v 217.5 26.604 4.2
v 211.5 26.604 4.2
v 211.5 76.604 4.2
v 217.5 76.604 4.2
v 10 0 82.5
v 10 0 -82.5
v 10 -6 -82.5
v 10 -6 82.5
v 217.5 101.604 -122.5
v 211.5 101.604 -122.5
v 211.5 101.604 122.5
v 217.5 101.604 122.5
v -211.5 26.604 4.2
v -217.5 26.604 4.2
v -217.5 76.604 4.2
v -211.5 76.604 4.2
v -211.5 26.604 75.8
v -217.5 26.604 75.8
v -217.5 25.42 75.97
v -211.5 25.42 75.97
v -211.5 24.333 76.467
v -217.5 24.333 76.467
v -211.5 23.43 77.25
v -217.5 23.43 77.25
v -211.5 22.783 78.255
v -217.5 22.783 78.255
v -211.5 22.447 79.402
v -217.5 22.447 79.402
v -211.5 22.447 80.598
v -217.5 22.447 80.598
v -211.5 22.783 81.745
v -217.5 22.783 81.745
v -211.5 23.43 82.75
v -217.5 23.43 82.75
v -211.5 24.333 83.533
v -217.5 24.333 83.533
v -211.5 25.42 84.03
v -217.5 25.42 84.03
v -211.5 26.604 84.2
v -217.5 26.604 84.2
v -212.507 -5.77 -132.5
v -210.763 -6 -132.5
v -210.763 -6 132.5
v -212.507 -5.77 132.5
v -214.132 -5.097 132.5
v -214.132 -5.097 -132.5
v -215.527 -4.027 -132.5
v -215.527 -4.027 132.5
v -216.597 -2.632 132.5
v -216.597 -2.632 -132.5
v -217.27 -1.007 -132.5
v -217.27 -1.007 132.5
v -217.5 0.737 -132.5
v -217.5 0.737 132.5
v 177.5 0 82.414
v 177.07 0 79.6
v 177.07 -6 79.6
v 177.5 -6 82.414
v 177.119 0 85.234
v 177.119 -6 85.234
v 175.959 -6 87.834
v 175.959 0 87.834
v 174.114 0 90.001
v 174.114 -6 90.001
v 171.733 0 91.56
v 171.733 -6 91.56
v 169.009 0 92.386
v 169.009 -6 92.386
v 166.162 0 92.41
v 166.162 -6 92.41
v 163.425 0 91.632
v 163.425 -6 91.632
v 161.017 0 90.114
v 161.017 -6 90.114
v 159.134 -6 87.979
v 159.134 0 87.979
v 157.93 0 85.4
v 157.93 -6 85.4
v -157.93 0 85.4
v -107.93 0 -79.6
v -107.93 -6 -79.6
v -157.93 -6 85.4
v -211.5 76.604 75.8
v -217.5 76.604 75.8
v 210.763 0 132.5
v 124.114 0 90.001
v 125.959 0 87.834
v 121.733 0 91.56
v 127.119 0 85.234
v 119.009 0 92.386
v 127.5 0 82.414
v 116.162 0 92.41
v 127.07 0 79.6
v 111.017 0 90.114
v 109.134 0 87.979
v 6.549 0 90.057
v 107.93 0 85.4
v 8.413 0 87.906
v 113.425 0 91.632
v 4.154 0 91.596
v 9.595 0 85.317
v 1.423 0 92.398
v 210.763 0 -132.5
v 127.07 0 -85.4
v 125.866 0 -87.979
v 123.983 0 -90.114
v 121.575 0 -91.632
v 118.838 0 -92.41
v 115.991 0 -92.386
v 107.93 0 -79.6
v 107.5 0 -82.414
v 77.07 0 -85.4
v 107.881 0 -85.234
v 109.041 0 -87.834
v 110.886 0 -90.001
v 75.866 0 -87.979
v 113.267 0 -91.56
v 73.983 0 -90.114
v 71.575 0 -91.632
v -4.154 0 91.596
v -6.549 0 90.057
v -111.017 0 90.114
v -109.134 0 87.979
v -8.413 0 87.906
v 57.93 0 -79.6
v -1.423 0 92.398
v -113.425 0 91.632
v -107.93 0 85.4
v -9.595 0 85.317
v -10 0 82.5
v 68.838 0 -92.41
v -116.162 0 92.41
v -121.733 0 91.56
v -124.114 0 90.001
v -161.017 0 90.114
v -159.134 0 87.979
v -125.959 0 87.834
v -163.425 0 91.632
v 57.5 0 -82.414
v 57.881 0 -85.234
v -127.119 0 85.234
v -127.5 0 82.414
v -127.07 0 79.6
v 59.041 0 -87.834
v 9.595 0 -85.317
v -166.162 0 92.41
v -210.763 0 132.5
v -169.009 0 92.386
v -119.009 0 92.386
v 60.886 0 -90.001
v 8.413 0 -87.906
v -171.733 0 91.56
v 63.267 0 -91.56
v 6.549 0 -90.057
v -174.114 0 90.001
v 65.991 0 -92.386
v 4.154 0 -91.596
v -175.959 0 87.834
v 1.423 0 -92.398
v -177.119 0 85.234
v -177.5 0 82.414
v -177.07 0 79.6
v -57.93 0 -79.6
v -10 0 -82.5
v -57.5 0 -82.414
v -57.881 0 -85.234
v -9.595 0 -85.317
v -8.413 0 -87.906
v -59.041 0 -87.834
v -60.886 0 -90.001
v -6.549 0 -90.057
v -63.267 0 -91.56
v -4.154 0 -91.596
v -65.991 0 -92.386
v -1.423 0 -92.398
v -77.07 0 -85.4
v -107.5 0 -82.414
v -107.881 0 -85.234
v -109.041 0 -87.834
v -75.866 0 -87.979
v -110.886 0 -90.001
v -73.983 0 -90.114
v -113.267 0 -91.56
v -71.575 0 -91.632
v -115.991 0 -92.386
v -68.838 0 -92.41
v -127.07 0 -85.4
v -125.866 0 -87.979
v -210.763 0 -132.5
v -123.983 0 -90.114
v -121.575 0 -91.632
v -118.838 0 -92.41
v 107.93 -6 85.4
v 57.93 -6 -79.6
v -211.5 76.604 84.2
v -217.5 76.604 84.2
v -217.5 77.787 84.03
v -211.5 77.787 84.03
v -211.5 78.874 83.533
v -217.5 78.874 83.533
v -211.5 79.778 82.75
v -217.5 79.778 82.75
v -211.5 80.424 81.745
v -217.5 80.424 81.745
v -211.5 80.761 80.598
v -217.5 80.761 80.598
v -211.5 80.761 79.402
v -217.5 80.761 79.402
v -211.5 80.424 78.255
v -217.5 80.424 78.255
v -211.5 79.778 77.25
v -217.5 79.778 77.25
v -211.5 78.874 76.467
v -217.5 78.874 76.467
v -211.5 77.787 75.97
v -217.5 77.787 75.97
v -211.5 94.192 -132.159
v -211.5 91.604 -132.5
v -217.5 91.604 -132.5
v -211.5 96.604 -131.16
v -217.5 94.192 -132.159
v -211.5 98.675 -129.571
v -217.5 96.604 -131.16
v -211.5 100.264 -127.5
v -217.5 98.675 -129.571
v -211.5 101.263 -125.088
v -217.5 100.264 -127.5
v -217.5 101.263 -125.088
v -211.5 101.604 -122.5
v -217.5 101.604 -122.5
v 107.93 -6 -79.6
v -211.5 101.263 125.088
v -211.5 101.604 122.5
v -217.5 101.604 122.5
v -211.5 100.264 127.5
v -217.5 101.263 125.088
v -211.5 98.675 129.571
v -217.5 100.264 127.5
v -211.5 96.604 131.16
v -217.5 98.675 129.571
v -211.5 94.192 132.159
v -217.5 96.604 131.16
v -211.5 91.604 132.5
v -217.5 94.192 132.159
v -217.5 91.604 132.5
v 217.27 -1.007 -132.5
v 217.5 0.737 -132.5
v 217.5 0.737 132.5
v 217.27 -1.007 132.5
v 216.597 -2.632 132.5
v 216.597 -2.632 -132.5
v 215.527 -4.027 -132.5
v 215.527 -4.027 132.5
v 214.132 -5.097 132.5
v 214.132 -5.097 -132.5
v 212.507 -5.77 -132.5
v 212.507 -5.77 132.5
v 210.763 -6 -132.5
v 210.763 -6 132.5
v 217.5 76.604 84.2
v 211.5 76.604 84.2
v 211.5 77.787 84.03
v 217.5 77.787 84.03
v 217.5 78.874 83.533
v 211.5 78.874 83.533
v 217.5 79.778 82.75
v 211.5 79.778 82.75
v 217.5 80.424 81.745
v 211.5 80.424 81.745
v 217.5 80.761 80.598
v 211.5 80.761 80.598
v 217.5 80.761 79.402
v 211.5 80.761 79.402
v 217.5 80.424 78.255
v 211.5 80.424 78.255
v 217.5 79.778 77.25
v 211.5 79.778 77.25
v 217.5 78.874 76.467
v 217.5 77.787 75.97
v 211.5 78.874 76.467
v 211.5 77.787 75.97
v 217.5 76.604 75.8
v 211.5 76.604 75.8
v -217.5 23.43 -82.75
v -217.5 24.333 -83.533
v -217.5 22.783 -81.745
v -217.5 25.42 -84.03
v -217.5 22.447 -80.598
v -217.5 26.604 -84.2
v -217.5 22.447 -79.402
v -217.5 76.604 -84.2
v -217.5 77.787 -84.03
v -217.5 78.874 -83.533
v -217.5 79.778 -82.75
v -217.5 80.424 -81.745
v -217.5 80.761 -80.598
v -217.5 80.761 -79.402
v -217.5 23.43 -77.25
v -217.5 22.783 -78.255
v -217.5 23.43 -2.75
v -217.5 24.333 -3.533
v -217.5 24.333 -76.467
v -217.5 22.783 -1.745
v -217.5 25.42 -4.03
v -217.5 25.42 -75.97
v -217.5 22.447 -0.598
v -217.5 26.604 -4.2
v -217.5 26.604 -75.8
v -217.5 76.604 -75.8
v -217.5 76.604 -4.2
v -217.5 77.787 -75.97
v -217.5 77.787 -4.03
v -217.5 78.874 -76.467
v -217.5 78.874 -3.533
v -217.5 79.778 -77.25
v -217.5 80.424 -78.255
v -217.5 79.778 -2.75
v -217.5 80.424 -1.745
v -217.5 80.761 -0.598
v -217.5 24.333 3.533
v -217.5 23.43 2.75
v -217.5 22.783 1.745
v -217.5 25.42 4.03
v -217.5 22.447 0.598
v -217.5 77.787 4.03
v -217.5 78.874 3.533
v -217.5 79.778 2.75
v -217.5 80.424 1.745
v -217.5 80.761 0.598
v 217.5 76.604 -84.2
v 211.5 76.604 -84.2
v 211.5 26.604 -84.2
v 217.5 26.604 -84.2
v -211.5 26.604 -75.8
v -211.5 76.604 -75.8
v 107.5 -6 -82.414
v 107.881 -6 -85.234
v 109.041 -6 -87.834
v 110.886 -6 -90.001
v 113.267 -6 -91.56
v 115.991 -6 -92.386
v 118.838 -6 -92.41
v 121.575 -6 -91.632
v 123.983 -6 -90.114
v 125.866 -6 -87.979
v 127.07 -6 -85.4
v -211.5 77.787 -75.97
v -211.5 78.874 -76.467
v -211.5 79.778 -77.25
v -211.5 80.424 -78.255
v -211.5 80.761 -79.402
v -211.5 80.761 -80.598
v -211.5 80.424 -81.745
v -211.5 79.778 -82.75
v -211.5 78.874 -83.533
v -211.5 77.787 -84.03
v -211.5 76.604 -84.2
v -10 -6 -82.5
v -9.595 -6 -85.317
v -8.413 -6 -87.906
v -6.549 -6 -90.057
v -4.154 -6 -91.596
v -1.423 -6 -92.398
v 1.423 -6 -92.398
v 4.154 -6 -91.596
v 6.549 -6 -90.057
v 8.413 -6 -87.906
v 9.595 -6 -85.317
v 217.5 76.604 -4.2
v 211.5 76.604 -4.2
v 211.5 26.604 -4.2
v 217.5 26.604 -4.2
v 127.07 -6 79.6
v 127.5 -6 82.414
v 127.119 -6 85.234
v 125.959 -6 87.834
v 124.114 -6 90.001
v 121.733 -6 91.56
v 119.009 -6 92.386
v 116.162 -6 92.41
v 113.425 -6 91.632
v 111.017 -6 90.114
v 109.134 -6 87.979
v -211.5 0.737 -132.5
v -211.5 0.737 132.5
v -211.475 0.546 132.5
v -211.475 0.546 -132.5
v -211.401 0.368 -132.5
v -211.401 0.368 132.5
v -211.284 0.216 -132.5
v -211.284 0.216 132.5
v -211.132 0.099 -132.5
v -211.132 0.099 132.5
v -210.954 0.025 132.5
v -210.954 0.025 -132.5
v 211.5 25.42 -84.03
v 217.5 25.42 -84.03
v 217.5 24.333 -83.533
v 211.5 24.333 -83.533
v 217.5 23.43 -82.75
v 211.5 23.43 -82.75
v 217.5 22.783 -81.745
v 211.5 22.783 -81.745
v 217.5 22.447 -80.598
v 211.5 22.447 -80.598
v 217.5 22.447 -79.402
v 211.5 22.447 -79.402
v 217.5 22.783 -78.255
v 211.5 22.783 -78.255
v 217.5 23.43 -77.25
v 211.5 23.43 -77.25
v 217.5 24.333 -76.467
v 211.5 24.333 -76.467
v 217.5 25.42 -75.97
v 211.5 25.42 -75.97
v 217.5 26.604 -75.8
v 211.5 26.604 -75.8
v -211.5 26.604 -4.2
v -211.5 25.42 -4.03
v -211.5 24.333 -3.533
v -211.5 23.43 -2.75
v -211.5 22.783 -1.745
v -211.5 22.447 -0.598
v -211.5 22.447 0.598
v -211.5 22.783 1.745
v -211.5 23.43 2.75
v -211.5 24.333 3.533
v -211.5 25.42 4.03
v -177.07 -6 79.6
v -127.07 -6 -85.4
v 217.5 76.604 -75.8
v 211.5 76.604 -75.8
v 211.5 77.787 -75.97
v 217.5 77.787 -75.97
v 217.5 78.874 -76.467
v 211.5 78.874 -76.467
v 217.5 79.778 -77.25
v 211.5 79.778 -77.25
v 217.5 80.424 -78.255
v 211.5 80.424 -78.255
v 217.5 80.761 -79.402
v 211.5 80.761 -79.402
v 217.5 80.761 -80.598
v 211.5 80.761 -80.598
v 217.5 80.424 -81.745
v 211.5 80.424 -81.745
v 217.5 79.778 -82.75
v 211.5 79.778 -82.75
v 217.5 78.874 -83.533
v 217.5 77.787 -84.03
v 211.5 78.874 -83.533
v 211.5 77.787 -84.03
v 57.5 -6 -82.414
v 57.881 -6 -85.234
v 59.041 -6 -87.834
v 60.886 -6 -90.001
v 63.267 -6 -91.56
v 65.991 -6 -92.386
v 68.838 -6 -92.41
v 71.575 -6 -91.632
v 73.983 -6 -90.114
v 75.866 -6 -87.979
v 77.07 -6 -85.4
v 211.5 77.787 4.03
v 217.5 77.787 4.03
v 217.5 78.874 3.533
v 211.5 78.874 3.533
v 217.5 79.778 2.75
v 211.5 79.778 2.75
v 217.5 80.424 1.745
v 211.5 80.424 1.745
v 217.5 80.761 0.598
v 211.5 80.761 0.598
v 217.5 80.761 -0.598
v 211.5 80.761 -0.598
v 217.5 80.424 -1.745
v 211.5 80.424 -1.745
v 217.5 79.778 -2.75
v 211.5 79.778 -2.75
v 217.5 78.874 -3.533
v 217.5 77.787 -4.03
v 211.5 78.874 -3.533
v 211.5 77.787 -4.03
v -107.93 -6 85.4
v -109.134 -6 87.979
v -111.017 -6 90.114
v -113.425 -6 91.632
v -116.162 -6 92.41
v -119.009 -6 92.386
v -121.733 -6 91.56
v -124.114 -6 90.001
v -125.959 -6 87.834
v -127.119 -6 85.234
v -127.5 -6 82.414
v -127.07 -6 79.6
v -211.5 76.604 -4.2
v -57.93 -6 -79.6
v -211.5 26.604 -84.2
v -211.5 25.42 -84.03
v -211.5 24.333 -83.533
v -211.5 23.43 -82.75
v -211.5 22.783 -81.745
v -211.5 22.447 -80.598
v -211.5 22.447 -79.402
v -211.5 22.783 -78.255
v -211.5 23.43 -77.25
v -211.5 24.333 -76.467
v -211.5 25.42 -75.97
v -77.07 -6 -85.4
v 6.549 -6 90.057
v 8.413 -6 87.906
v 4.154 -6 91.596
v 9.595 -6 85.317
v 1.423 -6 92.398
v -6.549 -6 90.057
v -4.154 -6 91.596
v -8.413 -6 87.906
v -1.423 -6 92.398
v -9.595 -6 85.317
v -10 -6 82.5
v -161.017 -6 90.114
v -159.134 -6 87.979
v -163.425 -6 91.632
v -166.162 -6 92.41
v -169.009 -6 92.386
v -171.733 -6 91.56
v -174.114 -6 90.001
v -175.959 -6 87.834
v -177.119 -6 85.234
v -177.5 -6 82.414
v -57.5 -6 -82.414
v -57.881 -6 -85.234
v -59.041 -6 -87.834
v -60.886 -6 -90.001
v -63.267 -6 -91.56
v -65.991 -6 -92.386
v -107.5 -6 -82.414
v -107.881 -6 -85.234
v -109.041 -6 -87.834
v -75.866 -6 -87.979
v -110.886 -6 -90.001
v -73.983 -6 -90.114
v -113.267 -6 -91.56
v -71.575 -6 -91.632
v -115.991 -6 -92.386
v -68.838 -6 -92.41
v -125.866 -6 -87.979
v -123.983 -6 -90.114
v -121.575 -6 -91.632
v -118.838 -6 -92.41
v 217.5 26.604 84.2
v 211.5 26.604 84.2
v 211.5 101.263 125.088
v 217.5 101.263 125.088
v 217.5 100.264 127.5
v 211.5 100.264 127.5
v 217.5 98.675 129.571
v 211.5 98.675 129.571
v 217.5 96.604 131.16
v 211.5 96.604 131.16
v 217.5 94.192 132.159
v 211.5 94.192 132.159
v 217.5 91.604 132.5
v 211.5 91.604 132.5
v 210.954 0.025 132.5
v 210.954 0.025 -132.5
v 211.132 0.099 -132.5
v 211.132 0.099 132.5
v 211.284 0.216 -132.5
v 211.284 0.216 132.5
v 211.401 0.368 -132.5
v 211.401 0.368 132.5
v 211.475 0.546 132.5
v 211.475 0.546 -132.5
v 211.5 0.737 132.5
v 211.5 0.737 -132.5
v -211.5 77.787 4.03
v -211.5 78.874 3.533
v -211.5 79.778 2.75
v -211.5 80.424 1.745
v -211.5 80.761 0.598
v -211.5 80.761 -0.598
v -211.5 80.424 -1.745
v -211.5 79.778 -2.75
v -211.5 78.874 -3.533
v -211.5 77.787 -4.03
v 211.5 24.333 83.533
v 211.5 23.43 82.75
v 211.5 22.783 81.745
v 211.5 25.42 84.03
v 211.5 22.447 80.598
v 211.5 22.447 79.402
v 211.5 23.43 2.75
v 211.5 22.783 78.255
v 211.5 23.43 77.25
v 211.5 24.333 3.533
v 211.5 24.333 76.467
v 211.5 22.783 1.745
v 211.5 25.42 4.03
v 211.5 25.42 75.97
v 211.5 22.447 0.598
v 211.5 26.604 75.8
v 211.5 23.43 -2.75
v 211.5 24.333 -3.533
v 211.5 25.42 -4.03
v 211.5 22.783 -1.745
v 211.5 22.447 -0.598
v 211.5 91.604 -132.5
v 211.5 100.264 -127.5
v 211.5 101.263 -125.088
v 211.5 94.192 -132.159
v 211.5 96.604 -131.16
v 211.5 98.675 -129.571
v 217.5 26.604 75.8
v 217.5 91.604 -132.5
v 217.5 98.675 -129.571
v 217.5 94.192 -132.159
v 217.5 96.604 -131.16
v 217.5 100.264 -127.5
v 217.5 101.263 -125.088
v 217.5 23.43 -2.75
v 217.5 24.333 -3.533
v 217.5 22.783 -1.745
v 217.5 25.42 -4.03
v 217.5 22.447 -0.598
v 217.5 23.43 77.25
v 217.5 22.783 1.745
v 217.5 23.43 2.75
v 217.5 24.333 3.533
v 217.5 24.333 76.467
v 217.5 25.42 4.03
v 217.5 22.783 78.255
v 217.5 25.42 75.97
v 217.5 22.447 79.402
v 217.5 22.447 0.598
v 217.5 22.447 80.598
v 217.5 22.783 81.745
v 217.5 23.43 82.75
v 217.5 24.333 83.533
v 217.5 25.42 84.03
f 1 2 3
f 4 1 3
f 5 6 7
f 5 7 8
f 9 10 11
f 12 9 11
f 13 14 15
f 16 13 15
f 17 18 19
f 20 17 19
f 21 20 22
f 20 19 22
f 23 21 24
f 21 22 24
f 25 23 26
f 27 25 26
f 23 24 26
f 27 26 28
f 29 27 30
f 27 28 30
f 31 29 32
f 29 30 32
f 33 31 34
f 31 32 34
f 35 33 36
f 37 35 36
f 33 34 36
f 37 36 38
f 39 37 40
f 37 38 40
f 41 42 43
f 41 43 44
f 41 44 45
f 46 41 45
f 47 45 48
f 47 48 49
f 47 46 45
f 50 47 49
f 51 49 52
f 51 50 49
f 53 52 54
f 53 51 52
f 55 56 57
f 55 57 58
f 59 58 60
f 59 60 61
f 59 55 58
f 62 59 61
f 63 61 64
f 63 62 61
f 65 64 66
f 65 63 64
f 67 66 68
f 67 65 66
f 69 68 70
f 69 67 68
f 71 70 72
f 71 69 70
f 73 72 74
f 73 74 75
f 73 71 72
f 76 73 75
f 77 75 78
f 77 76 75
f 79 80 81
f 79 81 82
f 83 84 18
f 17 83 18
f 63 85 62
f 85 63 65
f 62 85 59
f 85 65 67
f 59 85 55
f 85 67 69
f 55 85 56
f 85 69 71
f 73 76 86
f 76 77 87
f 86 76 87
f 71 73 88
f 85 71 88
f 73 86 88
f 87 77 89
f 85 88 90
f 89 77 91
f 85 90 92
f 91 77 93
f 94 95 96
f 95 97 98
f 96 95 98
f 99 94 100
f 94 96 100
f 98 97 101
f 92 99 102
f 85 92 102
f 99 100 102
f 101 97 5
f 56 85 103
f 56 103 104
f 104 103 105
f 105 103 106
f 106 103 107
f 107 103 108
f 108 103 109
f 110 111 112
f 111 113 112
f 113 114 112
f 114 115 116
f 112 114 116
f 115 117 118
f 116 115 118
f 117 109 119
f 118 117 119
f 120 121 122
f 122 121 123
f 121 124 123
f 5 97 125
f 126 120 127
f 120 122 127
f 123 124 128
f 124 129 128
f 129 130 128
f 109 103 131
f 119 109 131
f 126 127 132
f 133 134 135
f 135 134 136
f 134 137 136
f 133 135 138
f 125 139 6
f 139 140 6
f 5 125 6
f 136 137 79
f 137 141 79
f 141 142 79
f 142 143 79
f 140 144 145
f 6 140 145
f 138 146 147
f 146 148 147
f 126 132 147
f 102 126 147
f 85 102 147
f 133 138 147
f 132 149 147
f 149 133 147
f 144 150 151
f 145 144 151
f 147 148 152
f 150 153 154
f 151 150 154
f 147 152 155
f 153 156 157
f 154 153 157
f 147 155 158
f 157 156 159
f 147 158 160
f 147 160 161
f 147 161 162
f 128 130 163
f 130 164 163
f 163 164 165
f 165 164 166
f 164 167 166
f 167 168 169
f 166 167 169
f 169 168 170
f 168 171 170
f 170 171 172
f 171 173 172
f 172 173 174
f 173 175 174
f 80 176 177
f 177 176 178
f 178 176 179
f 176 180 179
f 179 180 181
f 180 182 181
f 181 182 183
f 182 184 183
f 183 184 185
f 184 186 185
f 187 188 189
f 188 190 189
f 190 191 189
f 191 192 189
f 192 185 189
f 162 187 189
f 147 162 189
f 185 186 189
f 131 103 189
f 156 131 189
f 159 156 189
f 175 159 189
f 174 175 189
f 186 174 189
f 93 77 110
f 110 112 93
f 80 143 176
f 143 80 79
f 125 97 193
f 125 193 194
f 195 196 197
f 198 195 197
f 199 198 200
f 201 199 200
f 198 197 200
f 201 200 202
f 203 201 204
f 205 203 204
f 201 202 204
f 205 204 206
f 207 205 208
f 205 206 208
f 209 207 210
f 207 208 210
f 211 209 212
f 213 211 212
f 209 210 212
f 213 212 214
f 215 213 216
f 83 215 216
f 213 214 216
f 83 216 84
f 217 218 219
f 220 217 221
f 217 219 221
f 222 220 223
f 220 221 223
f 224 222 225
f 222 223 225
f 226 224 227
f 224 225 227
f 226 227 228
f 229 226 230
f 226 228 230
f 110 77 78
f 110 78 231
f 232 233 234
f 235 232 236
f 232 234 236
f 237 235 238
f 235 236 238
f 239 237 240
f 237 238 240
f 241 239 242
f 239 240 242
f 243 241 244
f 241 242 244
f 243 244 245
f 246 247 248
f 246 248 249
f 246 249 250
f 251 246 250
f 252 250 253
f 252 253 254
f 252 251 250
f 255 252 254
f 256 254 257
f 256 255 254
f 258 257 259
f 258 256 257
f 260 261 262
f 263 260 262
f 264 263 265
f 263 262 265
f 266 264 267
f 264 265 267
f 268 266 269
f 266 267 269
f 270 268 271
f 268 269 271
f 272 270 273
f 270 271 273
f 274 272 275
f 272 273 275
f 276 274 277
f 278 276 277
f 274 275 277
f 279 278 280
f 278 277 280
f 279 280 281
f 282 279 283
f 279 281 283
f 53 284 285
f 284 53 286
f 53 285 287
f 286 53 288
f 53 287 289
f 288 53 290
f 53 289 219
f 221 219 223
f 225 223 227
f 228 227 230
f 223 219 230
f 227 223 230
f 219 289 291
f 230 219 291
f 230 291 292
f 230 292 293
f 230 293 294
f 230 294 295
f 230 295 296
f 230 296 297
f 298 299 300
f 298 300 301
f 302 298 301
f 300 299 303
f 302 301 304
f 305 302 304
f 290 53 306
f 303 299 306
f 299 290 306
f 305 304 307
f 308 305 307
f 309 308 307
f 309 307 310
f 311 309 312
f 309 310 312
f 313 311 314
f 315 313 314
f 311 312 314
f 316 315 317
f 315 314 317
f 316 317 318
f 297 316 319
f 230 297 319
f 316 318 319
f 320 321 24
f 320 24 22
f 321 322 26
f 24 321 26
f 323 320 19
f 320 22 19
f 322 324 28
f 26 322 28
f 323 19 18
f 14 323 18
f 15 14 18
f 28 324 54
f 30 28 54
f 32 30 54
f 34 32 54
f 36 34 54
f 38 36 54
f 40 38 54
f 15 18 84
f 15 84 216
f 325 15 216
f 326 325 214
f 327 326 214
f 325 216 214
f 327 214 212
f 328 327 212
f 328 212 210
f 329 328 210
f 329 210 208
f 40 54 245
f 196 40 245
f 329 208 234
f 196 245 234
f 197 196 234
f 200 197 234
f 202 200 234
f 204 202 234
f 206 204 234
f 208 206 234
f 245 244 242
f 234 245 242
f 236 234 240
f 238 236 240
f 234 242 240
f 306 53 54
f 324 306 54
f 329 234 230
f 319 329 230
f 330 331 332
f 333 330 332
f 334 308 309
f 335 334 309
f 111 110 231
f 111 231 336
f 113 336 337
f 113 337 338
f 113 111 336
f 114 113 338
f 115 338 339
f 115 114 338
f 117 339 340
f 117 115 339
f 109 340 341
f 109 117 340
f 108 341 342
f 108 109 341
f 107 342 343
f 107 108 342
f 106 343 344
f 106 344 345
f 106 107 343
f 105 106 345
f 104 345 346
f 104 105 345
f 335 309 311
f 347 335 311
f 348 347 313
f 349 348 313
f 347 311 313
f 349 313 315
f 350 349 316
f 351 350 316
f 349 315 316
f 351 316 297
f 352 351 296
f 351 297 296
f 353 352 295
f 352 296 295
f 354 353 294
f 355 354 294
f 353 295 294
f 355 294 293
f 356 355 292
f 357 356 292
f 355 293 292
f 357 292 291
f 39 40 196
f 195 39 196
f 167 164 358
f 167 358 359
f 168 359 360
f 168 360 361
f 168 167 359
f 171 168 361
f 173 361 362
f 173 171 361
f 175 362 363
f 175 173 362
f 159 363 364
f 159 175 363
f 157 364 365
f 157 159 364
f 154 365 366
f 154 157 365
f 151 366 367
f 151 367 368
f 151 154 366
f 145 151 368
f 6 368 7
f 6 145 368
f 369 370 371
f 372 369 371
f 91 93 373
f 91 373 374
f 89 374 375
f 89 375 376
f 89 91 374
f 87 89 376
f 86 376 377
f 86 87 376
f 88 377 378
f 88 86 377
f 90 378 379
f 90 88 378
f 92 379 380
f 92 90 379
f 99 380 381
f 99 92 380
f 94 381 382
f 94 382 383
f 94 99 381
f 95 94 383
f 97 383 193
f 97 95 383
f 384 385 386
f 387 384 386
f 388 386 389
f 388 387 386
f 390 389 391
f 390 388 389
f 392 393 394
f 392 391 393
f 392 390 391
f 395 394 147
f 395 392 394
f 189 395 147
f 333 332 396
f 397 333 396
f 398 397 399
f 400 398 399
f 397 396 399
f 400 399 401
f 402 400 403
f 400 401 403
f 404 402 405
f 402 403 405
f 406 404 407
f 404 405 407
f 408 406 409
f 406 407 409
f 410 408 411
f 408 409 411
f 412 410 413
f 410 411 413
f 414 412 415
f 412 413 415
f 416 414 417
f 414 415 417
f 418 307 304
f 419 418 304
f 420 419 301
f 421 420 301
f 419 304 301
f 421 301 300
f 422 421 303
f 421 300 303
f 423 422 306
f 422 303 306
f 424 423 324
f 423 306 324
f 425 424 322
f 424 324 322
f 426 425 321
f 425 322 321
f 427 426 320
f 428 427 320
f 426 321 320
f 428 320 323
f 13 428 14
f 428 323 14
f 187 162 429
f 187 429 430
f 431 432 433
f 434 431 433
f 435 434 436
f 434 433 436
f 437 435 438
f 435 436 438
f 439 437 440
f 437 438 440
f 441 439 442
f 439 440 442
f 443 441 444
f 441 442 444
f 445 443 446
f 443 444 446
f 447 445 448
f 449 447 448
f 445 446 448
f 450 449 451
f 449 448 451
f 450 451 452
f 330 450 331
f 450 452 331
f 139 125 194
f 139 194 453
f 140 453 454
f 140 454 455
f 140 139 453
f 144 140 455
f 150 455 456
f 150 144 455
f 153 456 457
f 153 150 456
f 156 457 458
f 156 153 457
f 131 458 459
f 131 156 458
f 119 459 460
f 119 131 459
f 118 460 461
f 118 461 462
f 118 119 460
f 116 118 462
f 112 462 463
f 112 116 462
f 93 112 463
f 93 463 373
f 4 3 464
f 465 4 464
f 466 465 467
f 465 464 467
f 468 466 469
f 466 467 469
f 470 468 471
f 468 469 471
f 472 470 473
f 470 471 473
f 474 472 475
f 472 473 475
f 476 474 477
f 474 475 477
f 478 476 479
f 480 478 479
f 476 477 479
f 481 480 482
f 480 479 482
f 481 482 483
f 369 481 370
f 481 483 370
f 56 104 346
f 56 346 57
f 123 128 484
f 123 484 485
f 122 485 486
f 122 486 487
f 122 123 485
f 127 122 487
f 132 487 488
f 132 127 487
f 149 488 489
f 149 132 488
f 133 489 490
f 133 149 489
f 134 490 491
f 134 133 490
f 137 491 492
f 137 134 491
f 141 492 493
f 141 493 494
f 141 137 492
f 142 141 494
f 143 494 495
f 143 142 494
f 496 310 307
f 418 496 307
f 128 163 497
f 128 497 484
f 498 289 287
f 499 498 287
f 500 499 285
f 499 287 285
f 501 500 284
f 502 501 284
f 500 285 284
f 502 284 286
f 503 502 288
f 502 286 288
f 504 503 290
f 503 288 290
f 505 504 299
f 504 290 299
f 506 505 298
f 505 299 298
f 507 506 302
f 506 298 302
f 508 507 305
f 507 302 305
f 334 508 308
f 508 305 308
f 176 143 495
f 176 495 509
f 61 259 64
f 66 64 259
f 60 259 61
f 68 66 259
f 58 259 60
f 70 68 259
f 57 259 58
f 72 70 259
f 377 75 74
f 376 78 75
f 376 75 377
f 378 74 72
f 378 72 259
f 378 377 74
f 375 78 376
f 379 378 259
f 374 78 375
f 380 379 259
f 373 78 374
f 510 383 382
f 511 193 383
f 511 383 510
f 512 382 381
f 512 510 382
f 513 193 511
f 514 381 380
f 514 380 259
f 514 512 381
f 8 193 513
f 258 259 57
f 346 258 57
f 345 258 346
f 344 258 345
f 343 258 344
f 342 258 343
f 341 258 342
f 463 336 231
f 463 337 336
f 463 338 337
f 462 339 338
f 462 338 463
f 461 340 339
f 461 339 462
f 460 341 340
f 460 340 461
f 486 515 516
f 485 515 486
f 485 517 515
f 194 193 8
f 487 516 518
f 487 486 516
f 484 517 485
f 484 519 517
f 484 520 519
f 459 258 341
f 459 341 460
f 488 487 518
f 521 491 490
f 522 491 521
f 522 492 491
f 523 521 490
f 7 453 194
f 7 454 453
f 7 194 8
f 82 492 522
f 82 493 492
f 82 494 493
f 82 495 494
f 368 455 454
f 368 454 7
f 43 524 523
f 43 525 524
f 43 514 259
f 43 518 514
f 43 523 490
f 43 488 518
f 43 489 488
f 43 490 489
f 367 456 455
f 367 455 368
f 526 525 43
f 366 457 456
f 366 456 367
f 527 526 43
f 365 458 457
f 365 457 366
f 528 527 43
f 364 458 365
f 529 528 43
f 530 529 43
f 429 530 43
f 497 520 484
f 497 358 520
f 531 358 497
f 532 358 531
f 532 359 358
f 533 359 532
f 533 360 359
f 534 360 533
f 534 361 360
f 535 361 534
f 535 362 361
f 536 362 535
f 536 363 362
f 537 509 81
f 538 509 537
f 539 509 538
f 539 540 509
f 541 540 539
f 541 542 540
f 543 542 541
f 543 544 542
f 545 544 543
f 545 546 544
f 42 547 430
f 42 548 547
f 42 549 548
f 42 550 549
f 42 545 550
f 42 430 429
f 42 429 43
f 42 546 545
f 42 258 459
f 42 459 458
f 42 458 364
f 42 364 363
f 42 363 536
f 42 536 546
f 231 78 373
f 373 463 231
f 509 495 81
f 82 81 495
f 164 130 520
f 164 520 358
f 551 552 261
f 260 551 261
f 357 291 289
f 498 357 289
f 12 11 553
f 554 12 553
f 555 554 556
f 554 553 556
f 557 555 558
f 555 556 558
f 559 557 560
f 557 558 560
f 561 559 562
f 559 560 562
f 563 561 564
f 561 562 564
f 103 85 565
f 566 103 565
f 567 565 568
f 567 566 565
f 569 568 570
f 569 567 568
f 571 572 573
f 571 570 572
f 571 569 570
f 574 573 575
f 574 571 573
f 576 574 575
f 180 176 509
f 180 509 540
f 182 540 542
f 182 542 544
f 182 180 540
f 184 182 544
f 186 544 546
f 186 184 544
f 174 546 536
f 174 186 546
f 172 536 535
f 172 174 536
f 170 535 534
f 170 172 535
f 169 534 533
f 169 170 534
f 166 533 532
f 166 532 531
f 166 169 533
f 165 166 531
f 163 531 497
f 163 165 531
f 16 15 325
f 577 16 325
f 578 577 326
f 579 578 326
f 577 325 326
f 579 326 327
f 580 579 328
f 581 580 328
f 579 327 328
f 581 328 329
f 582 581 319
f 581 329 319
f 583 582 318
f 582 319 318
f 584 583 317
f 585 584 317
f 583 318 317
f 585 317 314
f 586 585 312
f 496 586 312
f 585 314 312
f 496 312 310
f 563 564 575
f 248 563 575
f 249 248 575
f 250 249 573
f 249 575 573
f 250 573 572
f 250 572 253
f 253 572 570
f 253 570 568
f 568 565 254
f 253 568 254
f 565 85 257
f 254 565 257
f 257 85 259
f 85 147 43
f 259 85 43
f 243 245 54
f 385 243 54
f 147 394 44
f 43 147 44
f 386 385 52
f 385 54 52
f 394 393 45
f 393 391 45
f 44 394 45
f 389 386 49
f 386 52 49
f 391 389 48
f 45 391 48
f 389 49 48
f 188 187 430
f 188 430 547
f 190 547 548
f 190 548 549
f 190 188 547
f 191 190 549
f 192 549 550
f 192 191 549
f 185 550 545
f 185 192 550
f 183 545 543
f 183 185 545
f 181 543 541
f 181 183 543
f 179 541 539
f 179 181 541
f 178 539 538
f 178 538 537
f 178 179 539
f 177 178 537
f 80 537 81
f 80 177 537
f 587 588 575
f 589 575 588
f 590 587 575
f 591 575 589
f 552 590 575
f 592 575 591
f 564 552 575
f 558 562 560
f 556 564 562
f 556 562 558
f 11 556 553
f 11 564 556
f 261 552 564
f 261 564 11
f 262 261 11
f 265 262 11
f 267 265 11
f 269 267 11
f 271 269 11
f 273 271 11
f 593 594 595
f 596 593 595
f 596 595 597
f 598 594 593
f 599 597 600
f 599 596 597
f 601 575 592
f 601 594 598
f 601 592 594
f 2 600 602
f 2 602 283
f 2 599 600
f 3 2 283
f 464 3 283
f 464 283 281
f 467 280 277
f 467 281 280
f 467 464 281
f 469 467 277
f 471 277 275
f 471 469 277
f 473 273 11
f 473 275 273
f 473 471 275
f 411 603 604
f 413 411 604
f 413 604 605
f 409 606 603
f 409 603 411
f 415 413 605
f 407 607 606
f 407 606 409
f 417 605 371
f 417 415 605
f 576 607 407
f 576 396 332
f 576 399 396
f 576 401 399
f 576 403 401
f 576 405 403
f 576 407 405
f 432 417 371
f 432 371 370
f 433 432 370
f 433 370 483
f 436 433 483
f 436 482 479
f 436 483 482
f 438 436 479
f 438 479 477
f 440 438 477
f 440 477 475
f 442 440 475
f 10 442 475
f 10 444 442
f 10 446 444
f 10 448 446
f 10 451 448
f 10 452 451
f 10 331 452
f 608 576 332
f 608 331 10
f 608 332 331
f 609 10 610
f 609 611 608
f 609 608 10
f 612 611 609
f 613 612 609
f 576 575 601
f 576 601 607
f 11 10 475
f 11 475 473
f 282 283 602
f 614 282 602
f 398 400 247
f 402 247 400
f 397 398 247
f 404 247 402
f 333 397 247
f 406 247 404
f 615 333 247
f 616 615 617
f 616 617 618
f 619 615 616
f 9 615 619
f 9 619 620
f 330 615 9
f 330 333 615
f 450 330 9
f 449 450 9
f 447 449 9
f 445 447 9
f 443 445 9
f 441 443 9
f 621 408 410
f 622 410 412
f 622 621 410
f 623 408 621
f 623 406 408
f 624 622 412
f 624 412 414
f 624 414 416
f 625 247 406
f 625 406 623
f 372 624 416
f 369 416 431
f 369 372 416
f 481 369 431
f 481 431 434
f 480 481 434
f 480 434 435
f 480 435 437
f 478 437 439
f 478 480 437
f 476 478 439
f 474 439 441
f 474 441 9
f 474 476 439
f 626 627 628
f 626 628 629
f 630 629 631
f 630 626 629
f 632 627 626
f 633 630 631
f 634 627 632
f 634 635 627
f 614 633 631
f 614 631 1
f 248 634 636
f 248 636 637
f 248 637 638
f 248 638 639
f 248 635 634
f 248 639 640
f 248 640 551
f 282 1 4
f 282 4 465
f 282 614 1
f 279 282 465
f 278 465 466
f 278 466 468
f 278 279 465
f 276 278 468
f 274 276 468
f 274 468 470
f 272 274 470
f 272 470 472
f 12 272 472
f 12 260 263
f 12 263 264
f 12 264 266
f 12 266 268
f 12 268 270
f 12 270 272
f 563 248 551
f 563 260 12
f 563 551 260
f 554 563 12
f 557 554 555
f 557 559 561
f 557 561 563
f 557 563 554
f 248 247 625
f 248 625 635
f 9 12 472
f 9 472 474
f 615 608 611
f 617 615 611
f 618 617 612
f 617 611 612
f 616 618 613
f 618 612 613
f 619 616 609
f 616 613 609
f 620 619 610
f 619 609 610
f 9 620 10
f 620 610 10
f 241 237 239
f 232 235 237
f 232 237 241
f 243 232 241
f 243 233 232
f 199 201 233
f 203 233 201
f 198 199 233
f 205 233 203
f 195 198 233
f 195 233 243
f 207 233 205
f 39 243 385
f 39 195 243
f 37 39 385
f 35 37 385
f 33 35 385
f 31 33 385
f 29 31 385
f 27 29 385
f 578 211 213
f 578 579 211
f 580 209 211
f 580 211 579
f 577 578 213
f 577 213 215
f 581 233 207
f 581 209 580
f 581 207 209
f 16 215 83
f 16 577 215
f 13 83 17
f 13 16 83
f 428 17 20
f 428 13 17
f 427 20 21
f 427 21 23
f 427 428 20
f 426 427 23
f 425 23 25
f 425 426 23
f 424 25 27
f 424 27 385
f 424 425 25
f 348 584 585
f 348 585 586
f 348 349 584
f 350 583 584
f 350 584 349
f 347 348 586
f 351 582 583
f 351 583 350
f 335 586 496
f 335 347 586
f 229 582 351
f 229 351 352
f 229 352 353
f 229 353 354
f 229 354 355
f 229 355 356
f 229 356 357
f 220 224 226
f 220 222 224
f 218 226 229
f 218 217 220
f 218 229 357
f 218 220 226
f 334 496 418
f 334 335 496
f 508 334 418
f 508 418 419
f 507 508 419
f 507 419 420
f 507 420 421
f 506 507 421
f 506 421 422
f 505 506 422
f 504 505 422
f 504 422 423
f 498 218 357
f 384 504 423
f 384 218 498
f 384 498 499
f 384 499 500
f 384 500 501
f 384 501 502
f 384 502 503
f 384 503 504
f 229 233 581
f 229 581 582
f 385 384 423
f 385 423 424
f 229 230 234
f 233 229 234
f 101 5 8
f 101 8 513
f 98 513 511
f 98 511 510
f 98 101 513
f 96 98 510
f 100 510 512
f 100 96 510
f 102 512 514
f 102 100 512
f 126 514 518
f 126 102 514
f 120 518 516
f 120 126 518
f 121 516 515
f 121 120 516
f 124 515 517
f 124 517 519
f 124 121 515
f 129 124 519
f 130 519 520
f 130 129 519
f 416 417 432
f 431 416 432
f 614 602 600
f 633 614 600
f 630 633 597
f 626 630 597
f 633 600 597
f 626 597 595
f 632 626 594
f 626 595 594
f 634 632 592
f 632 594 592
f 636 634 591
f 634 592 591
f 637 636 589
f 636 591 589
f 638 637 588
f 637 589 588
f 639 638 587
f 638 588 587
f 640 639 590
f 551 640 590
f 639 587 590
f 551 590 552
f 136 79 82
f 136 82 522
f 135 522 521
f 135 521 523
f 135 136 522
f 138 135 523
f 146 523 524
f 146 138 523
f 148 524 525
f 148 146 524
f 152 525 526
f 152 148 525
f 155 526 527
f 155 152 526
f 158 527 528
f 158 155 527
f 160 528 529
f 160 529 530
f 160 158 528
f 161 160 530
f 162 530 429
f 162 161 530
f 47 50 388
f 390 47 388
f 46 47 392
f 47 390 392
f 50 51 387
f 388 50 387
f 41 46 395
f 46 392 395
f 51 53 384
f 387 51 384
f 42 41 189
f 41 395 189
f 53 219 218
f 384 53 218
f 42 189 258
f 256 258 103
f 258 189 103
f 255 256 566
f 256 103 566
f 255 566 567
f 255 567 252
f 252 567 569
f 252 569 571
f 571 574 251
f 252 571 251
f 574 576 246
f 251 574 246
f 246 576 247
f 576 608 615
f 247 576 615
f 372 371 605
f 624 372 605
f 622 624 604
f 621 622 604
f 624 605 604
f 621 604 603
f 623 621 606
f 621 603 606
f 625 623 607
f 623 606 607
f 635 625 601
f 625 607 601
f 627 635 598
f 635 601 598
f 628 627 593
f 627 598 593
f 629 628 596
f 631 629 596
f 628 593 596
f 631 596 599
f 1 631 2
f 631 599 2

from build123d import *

# Parameters (mm, degrees)
BASE_FLANGE1_DEPTH         = 6
SKETCHED_START             = -317.5
SKETCHED_BEND1_OUTLINE_W   = 6
SKETCHED_BEND1_OUTLINE_H   = 265
SKETCHED_BEND1_DEPTH       = 100
SKETCHED_START_2           = 217.5
SKETCHED_BEND1_2_OUTLINE_W = 6
SKETCHED_BEND1_2_OUTLINE_H = 265
SKETCHED_BEND1_2_DEPTH     = 100
SKETCHED_START_3           = -216.844798284
SKETCHED_BEND1_3_DEPTH     = 5.344798284
SKETCHED_START_4           = 211.5
SKETCHED_BEND1_4_DEPTH     = 5.344798284
SKETCHED_START_5           = -217.5
SKETCHED_BEND1_5_DEPTH     = 6.7366
SKETCHED_START_6           = 210.7634
SKETCHED_BEND1_6_DEPTH     = 6.7366
SKETCHED_START_7           = -133
SKETCHED_BEND1_7_DEPTH     = 266


with BuildPart() as part:
    # Base-Flange1: sheet metal written as solids
    # Sketch1 → Base-Flange1 (new body)
    with BuildSketch(Plane(origin=(0, 0, 0), x_dir=(1, 0, 0), z_dir=(0, 1, 0))):
        with BuildLine():
            Line((-307.5, 132.5), (307.5, 132.5))
            ThreePointArc((307.5, 132.5), (314.571067812, 129.571067812), (317.5, 122.5))
            Line((317.5, 122.5), (317.5, -122.5))
            ThreePointArc((317.5, -122.5), (314.571067812, -129.571067812), (307.5, -132.5))
            Line((307.5, -132.5), (-307.5, -132.5))
            ThreePointArc((-307.5, -132.5), (-314.571067812, -129.571067812), (-317.5, -122.5))
            Line((-317.5, -122.5), (-317.5, 122.5))
            ThreePointArc((-317.5, 122.5), (-314.571067812, 129.571067812), (-307.5, 132.5))
        make_face()
        with BuildLine():
            Line((-107.929755956, 79.599926047), (-157.929755956, -85.400073953))
            ThreePointArc((-157.929755956, -85.400073953), (-170.400073953, -92.070244044), (-177.070244044, -79.599926047))
            Line((-177.070244044, -79.599926047), (-127.070244044, 85.400073953))
            ThreePointArc((-127.070244044, 85.400073953), (-114.599926047, 92.070244044), (-107.929755956, 79.599926047))
        make_face(mode=Mode.SUBTRACT)
        with BuildLine():
            Line((-57.929755956, 79.599926047), (-107.929755956, -85.400073953))
            ThreePointArc((-107.929755956, -85.400073953), (-120.400073953, -92.070244044), (-127.070244044, -79.599926047))
            Line((-127.070244044, -79.599926047), (-77.070244044, 85.400073953))
            ThreePointArc((-77.070244044, 85.400073953), (-64.599926047, 92.070244044), (-57.929755956, 79.599926047))
        make_face(mode=Mode.SUBTRACT)
        with BuildLine():
            Line((77.070244044, 85.400073953), (127.070244044, -79.599926047))
            ThreePointArc((127.070244044, -79.599926047), (120.400073953, -92.070244044), (107.929755956, -85.400073953))
            Line((107.929755956, -85.400073953), (57.929755956, 79.599926047))
            ThreePointArc((57.929755956, 79.599926047), (64.599926047, 92.070244044), (77.070244044, 85.400073953))
        make_face(mode=Mode.SUBTRACT)
        with BuildLine():
            Line((127.070244044, 85.400073953), (177.070244044, -79.599926047))
            ThreePointArc((177.070244044, -79.599926047), (170.400073953, -92.070244044), (157.929755956, -85.400073953))
            Line((157.929755956, -85.400073953), (107.929755956, 79.599926047))
            ThreePointArc((107.929755956, 79.599926047), (114.599926047, 92.070244044), (127.070244044, 85.400073953))
        make_face(mode=Mode.SUBTRACT)
        with BuildLine():
            Line((-292.5, 84.2), (-242.5, 84.2))
            ThreePointArc((-242.5, 84.2), (-238.3, 80), (-242.5, 75.8))
            Line((-242.5, 75.8), (-292.5, 75.8))
            ThreePointArc((-292.5, 75.8), (-296.7, 80), (-292.5, 84.2))
        make_face(mode=Mode.SUBTRACT)
        with BuildLine():
            Line((-292.5, 4.2), (-242.5, 4.2))
            ThreePointArc((-242.5, 4.2), (-238.3, 0), (-242.5, -4.2))
            Line((-242.5, -4.2), (-292.5, -4.2))
            ThreePointArc((-292.5, -4.2), (-296.7, 0), (-292.5, 4.2))
        make_face(mode=Mode.SUBTRACT)
        with BuildLine():
            Line((-292.5, -75.8), (-242.5, -75.8))
            ThreePointArc((-242.5, -75.8), (-238.3, -80), (-242.5, -84.2))
            Line((-242.5, -84.2), (-292.5, -84.2))
            ThreePointArc((-292.5, -84.2), (-296.7, -80), (-292.5, -75.8))
        make_face(mode=Mode.SUBTRACT)
        with BuildLine():
            Line((242.5, 84.2), (292.5, 84.2))
            ThreePointArc((292.5, 84.2), (296.7, 80), (292.5, 75.8))
            Line((292.5, 75.8), (242.5, 75.8))
            ThreePointArc((242.5, 75.8), (238.3, 80), (242.5, 84.2))
        make_face(mode=Mode.SUBTRACT)
        with BuildLine():
            Line((242.5, 4.2), (292.5, 4.2))
            ThreePointArc((292.5, 4.2), (296.7, 0), (292.5, -4.2))
            Line((292.5, -4.2), (242.5, -4.2))
            ThreePointArc((242.5, -4.2), (238.3, 0), (242.5, 4.2))
        make_face(mode=Mode.SUBTRACT)
        with BuildLine():
            Line((242.5, -75.8), (292.5, -75.8))
            ThreePointArc((292.5, -75.8), (296.7, -80), (292.5, -84.2))
            Line((292.5, -84.2), (242.5, -84.2))
            ThreePointArc((242.5, -84.2), (238.3, -80), (242.5, -75.8))
        make_face(mode=Mode.SUBTRACT)
        with BuildLine():
            Line((10, 82.5), (10, -82.5))
            ThreePointArc((10, -82.5), (0, -92.5), (-10, -82.5))
            Line((-10, -82.5), (-10, 82.5))
            ThreePointArc((-10, 82.5), (0, 92.5), (10, 82.5))
        make_face(mode=Mode.SUBTRACT)
    extrude(amount=-BASE_FLANGE1_DEPTH)

    # Sketched Bend1: read off the stored shape, not the designer's step
    # Sketched Bend1 outline → Sketched Bend1 (cut)
    with BuildSketch(Plane.YZ.offset(SKETCHED_START)):
        with Locations((-3, 0)):
            Rectangle(SKETCHED_BEND1_OUTLINE_W, SKETCHED_BEND1_OUTLINE_H)
    extrude(amount=SKETCHED_BEND1_DEPTH, mode=Mode.SUBTRACT)

    # Sketched Bend1 2 outline → Sketched Bend1 2 (cut)
    with BuildSketch(Plane.YZ.offset(SKETCHED_START_2)):
        with Locations((-3, 0)):
            Rectangle(SKETCHED_BEND1_2_OUTLINE_W, SKETCHED_BEND1_2_OUTLINE_H)
    extrude(amount=SKETCHED_BEND1_2_DEPTH, mode=Mode.SUBTRACT)

    # Sketched Bend1 3 outline → Sketched Bend1 3 (add)
    with BuildSketch(Plane.YZ.offset(SKETCHED_START_3)):
        with BuildLine():
            Line((0, 132.5), (0, -132.5))
            Line((0, -132.5), (91.603762445, -132.5))
            ThreePointArc((91.603762445, -132.5), (98.674830257, -129.571067812), (101.603762445, -122.5))
            Line((101.603762445, -122.5), (101.603762445, 122.5))
            ThreePointArc((101.603762445, 122.5), (98.674830257, 129.571067812), (91.603762445, 132.5))
            Line((91.603762445, 132.5), (0, 132.5))
        make_face()
        with BuildLine():
            ThreePointArc((26.603762445, -84.2), (22.403762445, -80), (26.603762445, -75.8))
            Line((26.603762445, -75.8), (76.603762445, -75.8))
            ThreePointArc((76.603762445, -75.8), (80.803762445, -80), (76.603762445, -84.2))
            Line((76.603762445, -84.2), (26.603762445, -84.2))
        make_face(mode=Mode.SUBTRACT)
        with BuildLine():
            ThreePointArc((26.603762445, -4.2), (22.403762445, 0), (26.603762445, 4.2))
            Line((26.603762445, 4.2), (76.603762445, 4.2))
            ThreePointArc((76.603762445, 4.2), (80.803762445, 0), (76.603762445, -4.2))
            Line((76.603762445, -4.2), (26.603762445, -4.2))
        make_face(mode=Mode.SUBTRACT)
        with BuildLine():
            ThreePointArc((26.603762445, 75.8), (22.403762445, 80), (26.603762445, 84.2))
            Line((26.603762445, 84.2), (76.603762445, 84.2))
            ThreePointArc((76.603762445, 84.2), (80.803762445, 80), (76.603762445, 75.8))
            Line((76.603762445, 75.8), (26.603762445, 75.8))
        make_face(mode=Mode.SUBTRACT)
    extrude(amount=SKETCHED_BEND1_3_DEPTH)

    # Sketched Bend1 4 outline → Sketched Bend1 4 (add)
    with BuildSketch(Plane.YZ.offset(SKETCHED_START_4)):
        with BuildLine():
            Line((0, 132.5), (0, -132.5))
            Line((0, -132.5), (91.603762445, -132.5))
            ThreePointArc((91.603762445, -132.5), (98.674830257, -129.571067812), (101.603762445, -122.5))
            Line((101.603762445, -122.5), (101.603762445, 122.5))
            ThreePointArc((101.603762445, 122.5), (98.674830257, 129.571067812), (91.603762445, 132.5))
            Line((91.603762445, 132.5), (0, 132.5))
        make_face()
        with BuildLine():
            ThreePointArc((26.603762445, -84.2), (22.403762445, -80), (26.603762445, -75.8))
            Line((26.603762445, -75.8), (76.603762445, -75.8))
            ThreePointArc((76.603762445, -75.8), (80.803762445, -80), (76.603762445, -84.2))
            Line((76.603762445, -84.2), (26.603762445, -84.2))
        make_face(mode=Mode.SUBTRACT)
        with BuildLine():
            ThreePointArc((26.603762445, -4.2), (22.403762445, 0), (26.603762445, 4.2))
            Line((26.603762445, 4.2), (76.603762445, 4.2))
            ThreePointArc((76.603762445, 4.2), (80.803762445, 0), (76.603762445, -4.2))
            Line((76.603762445, -4.2), (26.603762445, -4.2))
        make_face(mode=Mode.SUBTRACT)
        with BuildLine():
            ThreePointArc((26.603762445, 75.8), (22.403762445, 80), (26.603762445, 84.2))
            Line((26.603762445, 84.2), (76.603762445, 84.2))
            ThreePointArc((76.603762445, 84.2), (80.803762445, 80), (76.603762445, 75.8))
            Line((76.603762445, 75.8), (26.603762445, 75.8))
        make_face(mode=Mode.SUBTRACT)
    extrude(amount=SKETCHED_BEND1_4_DEPTH)

    # Sketched Bend1 5 outline → Sketched Bend1 5 (add)
    with BuildSketch(Plane.YZ.offset(SKETCHED_START_5)):
        with BuildLine():
            Line((0, 132.5), (0, -132.5))
            Line((0, -132.5), (91.603762445, -132.5))
            ThreePointArc((91.603762445, -132.5), (98.674830257, -129.571067812), (101.603762445, -122.5))
            Line((101.603762445, -122.5), (101.603762445, 122.5))
            ThreePointArc((101.603762445, 122.5), (98.674830257, 129.571067812), (91.603762445, 132.5))
            Line((91.603762445, 132.5), (0, 132.5))
        make_face()
        with BuildLine():
            ThreePointArc((26.603762445, -84.2), (22.403762445, -80), (26.603762445, -75.8))
            Line((26.603762445, -75.8), (76.603762445, -75.8))
            ThreePointArc((76.603762445, -75.8), (80.803762445, -80), (76.603762445, -84.2))
            Line((76.603762445, -84.2), (26.603762445, -84.2))
        make_face(mode=Mode.SUBTRACT)
        with BuildLine():
            ThreePointArc((26.603762445, -4.2), (22.403762445, 0), (26.603762445, 4.2))
            Line((26.603762445, 4.2), (76.603762445, 4.2))
            ThreePointArc((76.603762445, 4.2), (80.803762445, 0), (76.603762445, -4.2))
            Line((76.603762445, -4.2), (26.603762445, -4.2))
        make_face(mode=Mode.SUBTRACT)
        with BuildLine():
            ThreePointArc((26.603762445, 75.8), (22.403762445, 80), (26.603762445, 84.2))
            Line((26.603762445, 84.2), (76.603762445, 84.2))
            ThreePointArc((76.603762445, 84.2), (80.803762445, 80), (76.603762445, 75.8))
            Line((76.603762445, 75.8), (26.603762445, 75.8))
        make_face(mode=Mode.SUBTRACT)
    extrude(amount=SKETCHED_BEND1_5_DEPTH)

    # Sketched Bend1 6 outline → Sketched Bend1 6 (add)
    with BuildSketch(Plane.YZ.offset(SKETCHED_START_6)):
        with BuildLine():
            Line((0, 132.5), (0, -132.5))
            Line((0, -132.5), (91.603762445, -132.5))
            ThreePointArc((91.603762445, -132.5), (98.674830257, -129.571067812), (101.603762445, -122.5))
            Line((101.603762445, -122.5), (101.603762445, 122.5))
            ThreePointArc((101.603762445, 122.5), (98.674830257, 129.571067812), (91.603762445, 132.5))
            Line((91.603762445, 132.5), (0, 132.5))
        make_face()
        with BuildLine():
            ThreePointArc((26.603762445, -84.2), (22.403762445, -80), (26.603762445, -75.8))
            Line((26.603762445, -75.8), (76.603762445, -75.8))
            ThreePointArc((76.603762445, -75.8), (80.803762445, -80), (76.603762445, -84.2))
            Line((76.603762445, -84.2), (26.603762445, -84.2))
        make_face(mode=Mode.SUBTRACT)
        with BuildLine():
            ThreePointArc((26.603762445, -4.2), (22.403762445, 0), (26.603762445, 4.2))
            Line((26.603762445, 4.2), (76.603762445, 4.2))
            ThreePointArc((76.603762445, 4.2), (80.803762445, 0), (76.603762445, -4.2))
            Line((76.603762445, -4.2), (26.603762445, -4.2))
        make_face(mode=Mode.SUBTRACT)
        with BuildLine():
            ThreePointArc((26.603762445, 75.8), (22.403762445, 80), (26.603762445, 84.2))
            Line((26.603762445, 84.2), (76.603762445, 84.2))
            ThreePointArc((76.603762445, 84.2), (80.803762445, 80), (76.603762445, 75.8))
            Line((76.603762445, 75.8), (26.603762445, 75.8))
        make_face(mode=Mode.SUBTRACT)
    extrude(amount=SKETCHED_BEND1_6_DEPTH)

    # Sketched Bend1 7 outline → Sketched Bend1 7 (cut)
    with BuildSketch(Plane.XY.offset(SKETCHED_START_7)):
        with BuildLine():
            Line((-217.5, -6), (-210.7634, -6))
            ThreePointArc((-210.7634, -6), (-215.526895542, -4.026895542), (-217.5, 0.7366))
            Line((-217.5, 0.7366), (-217.5, -6))
        make_face()
        with BuildLine():
            Line((211.5, 0.7366), (211.5, 101.603762445))
            Line((211.5, 101.603762445), (210.7634, 101.603762445))
            Line((210.7634, 101.603762445), (210.7634, 0))
            ThreePointArc((210.7634, 0), (211.284254855, 0.215745145), (211.5, 0.7366))
        make_face()
        with BuildLine():
            ThreePointArc((217.5, 0.7366), (215.526895542, -4.026895542), (210.7634, -6))
            Line((210.7634, -6), (217.5, -6))
            Line((217.5, -6), (217.5, 0.7366))
        make_face()
        with BuildLine():
            Line((-210.7634, 101.603762445), (-211.5, 101.603762445))
            Line((-211.5, 101.603762445), (-211.5, 0.7366))
            ThreePointArc((-211.5, 0.7366), (-211.284254855, 0.215745145), (-210.7634, 0))
            Line((-210.7634, 0), (-210.7634, 101.603762445))
        make_face()
    extrude(amount=SKETCHED_BEND1_7_DEPTH, mode=Mode.SUBTRACT)


solid = part.part
